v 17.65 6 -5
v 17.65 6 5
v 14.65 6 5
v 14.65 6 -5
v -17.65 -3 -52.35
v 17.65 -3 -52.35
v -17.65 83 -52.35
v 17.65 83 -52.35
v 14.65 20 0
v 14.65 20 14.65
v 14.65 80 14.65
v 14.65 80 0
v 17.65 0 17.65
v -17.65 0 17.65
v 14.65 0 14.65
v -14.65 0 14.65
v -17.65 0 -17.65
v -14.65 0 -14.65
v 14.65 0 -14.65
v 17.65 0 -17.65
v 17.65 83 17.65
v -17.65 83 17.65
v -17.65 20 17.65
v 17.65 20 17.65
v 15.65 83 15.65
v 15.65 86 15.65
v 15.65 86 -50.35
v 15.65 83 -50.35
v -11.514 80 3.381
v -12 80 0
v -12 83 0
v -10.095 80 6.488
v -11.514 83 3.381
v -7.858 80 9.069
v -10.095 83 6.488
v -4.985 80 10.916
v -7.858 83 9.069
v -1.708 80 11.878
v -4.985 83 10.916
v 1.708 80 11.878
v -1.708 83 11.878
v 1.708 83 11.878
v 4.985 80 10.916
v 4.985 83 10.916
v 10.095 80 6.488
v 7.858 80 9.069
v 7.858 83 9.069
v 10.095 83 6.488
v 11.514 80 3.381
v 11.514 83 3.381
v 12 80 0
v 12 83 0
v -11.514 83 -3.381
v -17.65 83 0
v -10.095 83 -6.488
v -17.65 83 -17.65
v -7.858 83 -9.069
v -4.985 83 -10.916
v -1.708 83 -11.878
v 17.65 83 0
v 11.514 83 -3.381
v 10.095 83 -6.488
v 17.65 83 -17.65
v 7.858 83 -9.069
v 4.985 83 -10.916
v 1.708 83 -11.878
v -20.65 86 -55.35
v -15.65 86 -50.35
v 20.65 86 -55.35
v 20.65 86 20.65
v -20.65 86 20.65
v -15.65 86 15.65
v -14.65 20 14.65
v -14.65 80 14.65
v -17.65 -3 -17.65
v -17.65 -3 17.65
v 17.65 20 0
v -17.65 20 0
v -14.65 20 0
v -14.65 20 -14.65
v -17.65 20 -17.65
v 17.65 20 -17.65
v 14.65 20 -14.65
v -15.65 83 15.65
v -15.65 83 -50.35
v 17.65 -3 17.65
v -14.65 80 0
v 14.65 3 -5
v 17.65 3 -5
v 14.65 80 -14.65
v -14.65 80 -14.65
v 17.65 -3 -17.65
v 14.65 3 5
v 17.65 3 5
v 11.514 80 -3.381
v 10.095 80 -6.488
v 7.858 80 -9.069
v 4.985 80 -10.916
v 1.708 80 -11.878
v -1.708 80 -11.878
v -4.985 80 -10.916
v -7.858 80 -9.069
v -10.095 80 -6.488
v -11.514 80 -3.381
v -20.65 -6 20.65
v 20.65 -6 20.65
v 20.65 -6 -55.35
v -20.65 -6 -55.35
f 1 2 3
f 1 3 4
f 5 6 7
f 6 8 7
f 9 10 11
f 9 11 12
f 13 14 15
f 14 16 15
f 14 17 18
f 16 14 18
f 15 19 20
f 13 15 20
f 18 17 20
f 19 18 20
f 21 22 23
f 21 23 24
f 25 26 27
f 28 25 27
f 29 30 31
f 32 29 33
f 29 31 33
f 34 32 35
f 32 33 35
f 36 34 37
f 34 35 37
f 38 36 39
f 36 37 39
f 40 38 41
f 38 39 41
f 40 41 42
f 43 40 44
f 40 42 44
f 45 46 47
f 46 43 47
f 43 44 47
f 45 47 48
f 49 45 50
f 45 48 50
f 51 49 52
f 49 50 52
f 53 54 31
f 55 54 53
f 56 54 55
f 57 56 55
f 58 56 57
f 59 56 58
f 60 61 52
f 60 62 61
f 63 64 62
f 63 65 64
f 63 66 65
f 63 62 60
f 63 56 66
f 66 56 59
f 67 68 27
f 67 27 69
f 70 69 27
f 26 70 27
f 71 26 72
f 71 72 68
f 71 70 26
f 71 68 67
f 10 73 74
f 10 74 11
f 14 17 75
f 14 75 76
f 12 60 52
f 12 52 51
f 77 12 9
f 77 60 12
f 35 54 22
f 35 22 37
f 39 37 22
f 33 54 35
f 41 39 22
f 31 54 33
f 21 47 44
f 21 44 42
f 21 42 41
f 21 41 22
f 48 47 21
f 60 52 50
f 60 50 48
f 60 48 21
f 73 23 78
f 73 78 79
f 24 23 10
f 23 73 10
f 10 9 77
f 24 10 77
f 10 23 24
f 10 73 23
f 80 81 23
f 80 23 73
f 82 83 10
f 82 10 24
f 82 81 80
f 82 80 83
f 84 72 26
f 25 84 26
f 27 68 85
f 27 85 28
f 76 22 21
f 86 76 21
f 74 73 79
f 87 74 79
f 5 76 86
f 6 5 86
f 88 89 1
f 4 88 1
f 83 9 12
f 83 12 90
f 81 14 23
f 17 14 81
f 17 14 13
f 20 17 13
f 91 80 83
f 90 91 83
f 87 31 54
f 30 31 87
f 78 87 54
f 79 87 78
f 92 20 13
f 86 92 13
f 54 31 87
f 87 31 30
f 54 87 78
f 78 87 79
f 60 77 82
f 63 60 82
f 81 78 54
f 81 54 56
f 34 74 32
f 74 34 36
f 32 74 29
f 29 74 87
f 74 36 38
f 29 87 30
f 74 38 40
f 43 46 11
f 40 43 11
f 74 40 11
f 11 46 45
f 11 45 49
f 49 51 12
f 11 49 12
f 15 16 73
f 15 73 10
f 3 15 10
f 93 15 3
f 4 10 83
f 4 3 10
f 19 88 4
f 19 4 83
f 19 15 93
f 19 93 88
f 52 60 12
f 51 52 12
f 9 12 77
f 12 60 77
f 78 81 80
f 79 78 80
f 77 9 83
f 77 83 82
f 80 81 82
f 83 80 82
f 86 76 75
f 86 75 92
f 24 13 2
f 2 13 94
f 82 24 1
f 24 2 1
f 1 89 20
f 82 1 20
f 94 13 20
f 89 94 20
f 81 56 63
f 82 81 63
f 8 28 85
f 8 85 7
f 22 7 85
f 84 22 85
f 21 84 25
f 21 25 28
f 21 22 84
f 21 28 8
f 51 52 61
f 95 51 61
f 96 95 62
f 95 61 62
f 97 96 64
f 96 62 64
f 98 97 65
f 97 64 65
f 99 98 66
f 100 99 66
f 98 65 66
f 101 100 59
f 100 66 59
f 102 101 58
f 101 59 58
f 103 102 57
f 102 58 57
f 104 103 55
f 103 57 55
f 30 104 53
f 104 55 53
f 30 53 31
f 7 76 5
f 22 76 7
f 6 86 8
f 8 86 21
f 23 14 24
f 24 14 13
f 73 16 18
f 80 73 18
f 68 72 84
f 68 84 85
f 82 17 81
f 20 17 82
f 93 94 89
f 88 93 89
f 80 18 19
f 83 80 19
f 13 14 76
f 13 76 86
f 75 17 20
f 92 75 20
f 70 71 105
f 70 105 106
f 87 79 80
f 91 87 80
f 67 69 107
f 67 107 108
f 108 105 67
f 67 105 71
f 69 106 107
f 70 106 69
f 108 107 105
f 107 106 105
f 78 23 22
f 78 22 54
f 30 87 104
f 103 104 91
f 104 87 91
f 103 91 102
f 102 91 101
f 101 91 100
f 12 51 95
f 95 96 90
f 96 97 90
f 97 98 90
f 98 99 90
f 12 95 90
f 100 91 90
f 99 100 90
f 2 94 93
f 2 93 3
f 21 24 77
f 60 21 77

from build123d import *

# Parameters (mm, degrees)
SKETCH1_W              = 35.3
SKETCH1_H              = 35.3
SKETCH1_W_2            = 29.3
SKETCH1_H_2            = 29.3
EXTRUDE_THIN1_DEPTH    = 20
SKETCH2_W              = 35.3
SKETCH2_H              = 35.3
BOSS_EXTRUDE3_DEPTH    = 3
SKETCH3_W              = 10
SKETCH3_H              = 3
CUT_EXTRUDE1_DEPTH     = 3
SKETCH5_W              = 35.3
SKETCH5_H              = 35.3
SKETCH5_W_2            = 29.3
SKETCH5_H_2            = 29.3
EXTRUDE_THIN2_DEPTH    = 60
SKETCH6_W              = 35.3
SKETCH6_H              = 35.3
BOSS_EXTRUDE4_DEPTH    = 3
SKETCH7_R              = 12
CUT_EXTRUDE2_DEPTH     = 3
SPLIT1_SURFACE_1_BACK  = 100.439
SPLIT1_SURFACE_1_DEPTH = 200.878
SPLIT1_SURFACE_2_BACK  = 100.439
SPLIT1_SURFACE_2_DEPTH = 200.878
SKETCH10_W             = 41.3
SKETCH10_H             = 92
SKETCH10_W_2           = 35.3
SKETCH10_H_2           = 86
EXTRUDE_THIN4_DEPTH    = 70
SKETCH15_W             = 41.3
SKETCH15_H             = 92
BOSS_EXTRUDE7_DEPTH    = 3
SKETCH16_W             = 41.3
SKETCH16_H             = 92
BOSS_EXTRUDE8_DEPTH    = 3
SKETCH17_W             = 31.3
SKETCH17_H             = 66
CUT_EXTRUDE6_DEPTH     = 3


with BuildPart() as part:
    # Sketch1 → Extrude-Thin1 (new body)
    with BuildSketch(Plane(origin=(0, 0, 0), x_dir=(1, 0, 0), z_dir=(0, 1, 0))):
        Rectangle(SKETCH1_W, SKETCH1_H)
        Rectangle(SKETCH1_W_2, SKETCH1_H_2, mode=Mode.SUBTRACT)
    extrude(amount=EXTRUDE_THIN1_DEPTH)

    # Sketch3 → Cut-Extrude1 (cut)
    with BuildSketch(Plane(origin=(17.65, 0, 0), x_dir=(0, 0, -1), z_dir=(1, 0, 0))):
        with Locations((0, 4.5)):
            Rectangle(SKETCH3_W, SKETCH3_H)
    extrude(amount=-CUT_EXTRUDE1_DEPTH, mode=Mode.SUBTRACT)


with BuildPart() as body_2:
    # Sketch2 → Boss-Extrude3 (new body)
    with BuildSketch(Plane.XZ):
        Rectangle(SKETCH2_W, SKETCH2_H)
    extrude(amount=BOSS_EXTRUDE3_DEPTH)


with BuildPart() as body_3:
    # Sketch5 → Extrude-Thin2 (new body)
    with BuildSketch(Plane(origin=(0, 20, 0), x_dir=(1, 0, 0), z_dir=(0, 1, 0))):
        Rectangle(SKETCH5_W, SKETCH5_H)
        Rectangle(SKETCH5_W_2, SKETCH5_H_2, mode=Mode.SUBTRACT)
    extrude(amount=EXTRUDE_THIN2_DEPTH)

    # Sketch6 → Boss-Extrude4 (add)
    with BuildSketch(Plane(origin=(0, 80, 0), x_dir=(1, 0, 0), z_dir=(0, 1, 0))):
        Rectangle(SKETCH6_W, SKETCH6_H)
    extrude(amount=BOSS_EXTRUDE4_DEPTH)

    # Sketch7 → Cut-Extrude2 (cut)
    with BuildSketch(Plane(origin=(0, 83, 0), x_dir=(1, 0, 0), z_dir=(0, 1, 0))):
        with Locations(Location((0, 0, 0), (0, 0, 270))):
            Circle(SKETCH7_R)
    extrude(amount=-CUT_EXTRUDE2_DEPTH, mode=Mode.SUBTRACT)


with BuildPart() as body_4:
    # Split1: the piece behind the surface
    add(body_3.part)
    # Split1 surface: a surface, the sketch's curves swept straight by 200.878 mm
    with BuildLine(Plane.ZY.offset(17.65).offset(-SPLIT1_SURFACE_1_BACK), mode=Mode.PRIVATE) as split1_surface_1_path:
        Line((0, 83), (0, 20))
    split1_surface_1 = Shell.extrude(split1_surface_1_path.wire(), (-1 * SPLIT1_SURFACE_1_DEPTH, 0 * SPLIT1_SURFACE_1_DEPTH, 0 * SPLIT1_SURFACE_1_DEPTH))
    split(bisect_by=split1_surface_1, keep=Keep.BOTTOM)


with BuildPart() as body_3_1:
    add(body_3.part)

    # Split1: split by a surface, the side it looks to stays
    # Split1 surface: a surface, the sketch's curves swept straight by 200.878 mm
    with BuildLine(Plane.ZY.offset(17.65).offset(-SPLIT1_SURFACE_2_BACK), mode=Mode.PRIVATE) as split1_surface_2_path:
        Line((0, 83), (0, 20))
    split1_surface_2 = Shell.extrude(split1_surface_2_path.wire(), (-1 * SPLIT1_SURFACE_2_DEPTH, 0 * SPLIT1_SURFACE_2_DEPTH, 0 * SPLIT1_SURFACE_2_DEPTH))
    split(bisect_by=split1_surface_2, keep=Keep.TOP)


with BuildPart() as body_5:
    # Sketch10 → Extrude-Thin4 (new body)
    with BuildSketch(Plane.XY.offset(17.65)):
        with Locations((0, 40)):
            Rectangle(SKETCH10_W, SKETCH10_H)
        with Locations((0, 40)):
            Rectangle(SKETCH10_W_2, SKETCH10_H_2, mode=Mode.SUBTRACT)
    extrude(amount=-EXTRUDE_THIN4_DEPTH)

    # Sketch15 → Boss-Extrude7 (add)
    with BuildSketch(Plane.XY.offset(17.65)):
        with Locations((0, 40)):
            Rectangle(SKETCH15_W, SKETCH15_H)
    extrude(amount=BOSS_EXTRUDE7_DEPTH)

    # Sketch16 → Boss-Extrude8 (add)
    with BuildSketch(Plane(origin=(0, 0, -52.35), x_dir=(-1, 0, 0), z_dir=(0, 0, -1))):
        with Locations((0, 40)):
            Rectangle(SKETCH16_W, SKETCH16_H)
    extrude(amount=BOSS_EXTRUDE8_DEPTH)

    # Sketch17 → Cut-Extrude6 (cut)
    with BuildSketch(Plane(origin=(0, 86, 0), x_dir=(1, 0, 0), z_dir=(0, 1, 0))):
        with Locations((0, 17.35)):
            Rectangle(SKETCH17_W, SKETCH17_H)
    extrude(amount=-CUT_EXTRUDE6_DEPTH, mode=Mode.SUBTRACT)


solid = Compound([part.part, body_2.part, body_4.part, body_3_1.part, body_5.part])
